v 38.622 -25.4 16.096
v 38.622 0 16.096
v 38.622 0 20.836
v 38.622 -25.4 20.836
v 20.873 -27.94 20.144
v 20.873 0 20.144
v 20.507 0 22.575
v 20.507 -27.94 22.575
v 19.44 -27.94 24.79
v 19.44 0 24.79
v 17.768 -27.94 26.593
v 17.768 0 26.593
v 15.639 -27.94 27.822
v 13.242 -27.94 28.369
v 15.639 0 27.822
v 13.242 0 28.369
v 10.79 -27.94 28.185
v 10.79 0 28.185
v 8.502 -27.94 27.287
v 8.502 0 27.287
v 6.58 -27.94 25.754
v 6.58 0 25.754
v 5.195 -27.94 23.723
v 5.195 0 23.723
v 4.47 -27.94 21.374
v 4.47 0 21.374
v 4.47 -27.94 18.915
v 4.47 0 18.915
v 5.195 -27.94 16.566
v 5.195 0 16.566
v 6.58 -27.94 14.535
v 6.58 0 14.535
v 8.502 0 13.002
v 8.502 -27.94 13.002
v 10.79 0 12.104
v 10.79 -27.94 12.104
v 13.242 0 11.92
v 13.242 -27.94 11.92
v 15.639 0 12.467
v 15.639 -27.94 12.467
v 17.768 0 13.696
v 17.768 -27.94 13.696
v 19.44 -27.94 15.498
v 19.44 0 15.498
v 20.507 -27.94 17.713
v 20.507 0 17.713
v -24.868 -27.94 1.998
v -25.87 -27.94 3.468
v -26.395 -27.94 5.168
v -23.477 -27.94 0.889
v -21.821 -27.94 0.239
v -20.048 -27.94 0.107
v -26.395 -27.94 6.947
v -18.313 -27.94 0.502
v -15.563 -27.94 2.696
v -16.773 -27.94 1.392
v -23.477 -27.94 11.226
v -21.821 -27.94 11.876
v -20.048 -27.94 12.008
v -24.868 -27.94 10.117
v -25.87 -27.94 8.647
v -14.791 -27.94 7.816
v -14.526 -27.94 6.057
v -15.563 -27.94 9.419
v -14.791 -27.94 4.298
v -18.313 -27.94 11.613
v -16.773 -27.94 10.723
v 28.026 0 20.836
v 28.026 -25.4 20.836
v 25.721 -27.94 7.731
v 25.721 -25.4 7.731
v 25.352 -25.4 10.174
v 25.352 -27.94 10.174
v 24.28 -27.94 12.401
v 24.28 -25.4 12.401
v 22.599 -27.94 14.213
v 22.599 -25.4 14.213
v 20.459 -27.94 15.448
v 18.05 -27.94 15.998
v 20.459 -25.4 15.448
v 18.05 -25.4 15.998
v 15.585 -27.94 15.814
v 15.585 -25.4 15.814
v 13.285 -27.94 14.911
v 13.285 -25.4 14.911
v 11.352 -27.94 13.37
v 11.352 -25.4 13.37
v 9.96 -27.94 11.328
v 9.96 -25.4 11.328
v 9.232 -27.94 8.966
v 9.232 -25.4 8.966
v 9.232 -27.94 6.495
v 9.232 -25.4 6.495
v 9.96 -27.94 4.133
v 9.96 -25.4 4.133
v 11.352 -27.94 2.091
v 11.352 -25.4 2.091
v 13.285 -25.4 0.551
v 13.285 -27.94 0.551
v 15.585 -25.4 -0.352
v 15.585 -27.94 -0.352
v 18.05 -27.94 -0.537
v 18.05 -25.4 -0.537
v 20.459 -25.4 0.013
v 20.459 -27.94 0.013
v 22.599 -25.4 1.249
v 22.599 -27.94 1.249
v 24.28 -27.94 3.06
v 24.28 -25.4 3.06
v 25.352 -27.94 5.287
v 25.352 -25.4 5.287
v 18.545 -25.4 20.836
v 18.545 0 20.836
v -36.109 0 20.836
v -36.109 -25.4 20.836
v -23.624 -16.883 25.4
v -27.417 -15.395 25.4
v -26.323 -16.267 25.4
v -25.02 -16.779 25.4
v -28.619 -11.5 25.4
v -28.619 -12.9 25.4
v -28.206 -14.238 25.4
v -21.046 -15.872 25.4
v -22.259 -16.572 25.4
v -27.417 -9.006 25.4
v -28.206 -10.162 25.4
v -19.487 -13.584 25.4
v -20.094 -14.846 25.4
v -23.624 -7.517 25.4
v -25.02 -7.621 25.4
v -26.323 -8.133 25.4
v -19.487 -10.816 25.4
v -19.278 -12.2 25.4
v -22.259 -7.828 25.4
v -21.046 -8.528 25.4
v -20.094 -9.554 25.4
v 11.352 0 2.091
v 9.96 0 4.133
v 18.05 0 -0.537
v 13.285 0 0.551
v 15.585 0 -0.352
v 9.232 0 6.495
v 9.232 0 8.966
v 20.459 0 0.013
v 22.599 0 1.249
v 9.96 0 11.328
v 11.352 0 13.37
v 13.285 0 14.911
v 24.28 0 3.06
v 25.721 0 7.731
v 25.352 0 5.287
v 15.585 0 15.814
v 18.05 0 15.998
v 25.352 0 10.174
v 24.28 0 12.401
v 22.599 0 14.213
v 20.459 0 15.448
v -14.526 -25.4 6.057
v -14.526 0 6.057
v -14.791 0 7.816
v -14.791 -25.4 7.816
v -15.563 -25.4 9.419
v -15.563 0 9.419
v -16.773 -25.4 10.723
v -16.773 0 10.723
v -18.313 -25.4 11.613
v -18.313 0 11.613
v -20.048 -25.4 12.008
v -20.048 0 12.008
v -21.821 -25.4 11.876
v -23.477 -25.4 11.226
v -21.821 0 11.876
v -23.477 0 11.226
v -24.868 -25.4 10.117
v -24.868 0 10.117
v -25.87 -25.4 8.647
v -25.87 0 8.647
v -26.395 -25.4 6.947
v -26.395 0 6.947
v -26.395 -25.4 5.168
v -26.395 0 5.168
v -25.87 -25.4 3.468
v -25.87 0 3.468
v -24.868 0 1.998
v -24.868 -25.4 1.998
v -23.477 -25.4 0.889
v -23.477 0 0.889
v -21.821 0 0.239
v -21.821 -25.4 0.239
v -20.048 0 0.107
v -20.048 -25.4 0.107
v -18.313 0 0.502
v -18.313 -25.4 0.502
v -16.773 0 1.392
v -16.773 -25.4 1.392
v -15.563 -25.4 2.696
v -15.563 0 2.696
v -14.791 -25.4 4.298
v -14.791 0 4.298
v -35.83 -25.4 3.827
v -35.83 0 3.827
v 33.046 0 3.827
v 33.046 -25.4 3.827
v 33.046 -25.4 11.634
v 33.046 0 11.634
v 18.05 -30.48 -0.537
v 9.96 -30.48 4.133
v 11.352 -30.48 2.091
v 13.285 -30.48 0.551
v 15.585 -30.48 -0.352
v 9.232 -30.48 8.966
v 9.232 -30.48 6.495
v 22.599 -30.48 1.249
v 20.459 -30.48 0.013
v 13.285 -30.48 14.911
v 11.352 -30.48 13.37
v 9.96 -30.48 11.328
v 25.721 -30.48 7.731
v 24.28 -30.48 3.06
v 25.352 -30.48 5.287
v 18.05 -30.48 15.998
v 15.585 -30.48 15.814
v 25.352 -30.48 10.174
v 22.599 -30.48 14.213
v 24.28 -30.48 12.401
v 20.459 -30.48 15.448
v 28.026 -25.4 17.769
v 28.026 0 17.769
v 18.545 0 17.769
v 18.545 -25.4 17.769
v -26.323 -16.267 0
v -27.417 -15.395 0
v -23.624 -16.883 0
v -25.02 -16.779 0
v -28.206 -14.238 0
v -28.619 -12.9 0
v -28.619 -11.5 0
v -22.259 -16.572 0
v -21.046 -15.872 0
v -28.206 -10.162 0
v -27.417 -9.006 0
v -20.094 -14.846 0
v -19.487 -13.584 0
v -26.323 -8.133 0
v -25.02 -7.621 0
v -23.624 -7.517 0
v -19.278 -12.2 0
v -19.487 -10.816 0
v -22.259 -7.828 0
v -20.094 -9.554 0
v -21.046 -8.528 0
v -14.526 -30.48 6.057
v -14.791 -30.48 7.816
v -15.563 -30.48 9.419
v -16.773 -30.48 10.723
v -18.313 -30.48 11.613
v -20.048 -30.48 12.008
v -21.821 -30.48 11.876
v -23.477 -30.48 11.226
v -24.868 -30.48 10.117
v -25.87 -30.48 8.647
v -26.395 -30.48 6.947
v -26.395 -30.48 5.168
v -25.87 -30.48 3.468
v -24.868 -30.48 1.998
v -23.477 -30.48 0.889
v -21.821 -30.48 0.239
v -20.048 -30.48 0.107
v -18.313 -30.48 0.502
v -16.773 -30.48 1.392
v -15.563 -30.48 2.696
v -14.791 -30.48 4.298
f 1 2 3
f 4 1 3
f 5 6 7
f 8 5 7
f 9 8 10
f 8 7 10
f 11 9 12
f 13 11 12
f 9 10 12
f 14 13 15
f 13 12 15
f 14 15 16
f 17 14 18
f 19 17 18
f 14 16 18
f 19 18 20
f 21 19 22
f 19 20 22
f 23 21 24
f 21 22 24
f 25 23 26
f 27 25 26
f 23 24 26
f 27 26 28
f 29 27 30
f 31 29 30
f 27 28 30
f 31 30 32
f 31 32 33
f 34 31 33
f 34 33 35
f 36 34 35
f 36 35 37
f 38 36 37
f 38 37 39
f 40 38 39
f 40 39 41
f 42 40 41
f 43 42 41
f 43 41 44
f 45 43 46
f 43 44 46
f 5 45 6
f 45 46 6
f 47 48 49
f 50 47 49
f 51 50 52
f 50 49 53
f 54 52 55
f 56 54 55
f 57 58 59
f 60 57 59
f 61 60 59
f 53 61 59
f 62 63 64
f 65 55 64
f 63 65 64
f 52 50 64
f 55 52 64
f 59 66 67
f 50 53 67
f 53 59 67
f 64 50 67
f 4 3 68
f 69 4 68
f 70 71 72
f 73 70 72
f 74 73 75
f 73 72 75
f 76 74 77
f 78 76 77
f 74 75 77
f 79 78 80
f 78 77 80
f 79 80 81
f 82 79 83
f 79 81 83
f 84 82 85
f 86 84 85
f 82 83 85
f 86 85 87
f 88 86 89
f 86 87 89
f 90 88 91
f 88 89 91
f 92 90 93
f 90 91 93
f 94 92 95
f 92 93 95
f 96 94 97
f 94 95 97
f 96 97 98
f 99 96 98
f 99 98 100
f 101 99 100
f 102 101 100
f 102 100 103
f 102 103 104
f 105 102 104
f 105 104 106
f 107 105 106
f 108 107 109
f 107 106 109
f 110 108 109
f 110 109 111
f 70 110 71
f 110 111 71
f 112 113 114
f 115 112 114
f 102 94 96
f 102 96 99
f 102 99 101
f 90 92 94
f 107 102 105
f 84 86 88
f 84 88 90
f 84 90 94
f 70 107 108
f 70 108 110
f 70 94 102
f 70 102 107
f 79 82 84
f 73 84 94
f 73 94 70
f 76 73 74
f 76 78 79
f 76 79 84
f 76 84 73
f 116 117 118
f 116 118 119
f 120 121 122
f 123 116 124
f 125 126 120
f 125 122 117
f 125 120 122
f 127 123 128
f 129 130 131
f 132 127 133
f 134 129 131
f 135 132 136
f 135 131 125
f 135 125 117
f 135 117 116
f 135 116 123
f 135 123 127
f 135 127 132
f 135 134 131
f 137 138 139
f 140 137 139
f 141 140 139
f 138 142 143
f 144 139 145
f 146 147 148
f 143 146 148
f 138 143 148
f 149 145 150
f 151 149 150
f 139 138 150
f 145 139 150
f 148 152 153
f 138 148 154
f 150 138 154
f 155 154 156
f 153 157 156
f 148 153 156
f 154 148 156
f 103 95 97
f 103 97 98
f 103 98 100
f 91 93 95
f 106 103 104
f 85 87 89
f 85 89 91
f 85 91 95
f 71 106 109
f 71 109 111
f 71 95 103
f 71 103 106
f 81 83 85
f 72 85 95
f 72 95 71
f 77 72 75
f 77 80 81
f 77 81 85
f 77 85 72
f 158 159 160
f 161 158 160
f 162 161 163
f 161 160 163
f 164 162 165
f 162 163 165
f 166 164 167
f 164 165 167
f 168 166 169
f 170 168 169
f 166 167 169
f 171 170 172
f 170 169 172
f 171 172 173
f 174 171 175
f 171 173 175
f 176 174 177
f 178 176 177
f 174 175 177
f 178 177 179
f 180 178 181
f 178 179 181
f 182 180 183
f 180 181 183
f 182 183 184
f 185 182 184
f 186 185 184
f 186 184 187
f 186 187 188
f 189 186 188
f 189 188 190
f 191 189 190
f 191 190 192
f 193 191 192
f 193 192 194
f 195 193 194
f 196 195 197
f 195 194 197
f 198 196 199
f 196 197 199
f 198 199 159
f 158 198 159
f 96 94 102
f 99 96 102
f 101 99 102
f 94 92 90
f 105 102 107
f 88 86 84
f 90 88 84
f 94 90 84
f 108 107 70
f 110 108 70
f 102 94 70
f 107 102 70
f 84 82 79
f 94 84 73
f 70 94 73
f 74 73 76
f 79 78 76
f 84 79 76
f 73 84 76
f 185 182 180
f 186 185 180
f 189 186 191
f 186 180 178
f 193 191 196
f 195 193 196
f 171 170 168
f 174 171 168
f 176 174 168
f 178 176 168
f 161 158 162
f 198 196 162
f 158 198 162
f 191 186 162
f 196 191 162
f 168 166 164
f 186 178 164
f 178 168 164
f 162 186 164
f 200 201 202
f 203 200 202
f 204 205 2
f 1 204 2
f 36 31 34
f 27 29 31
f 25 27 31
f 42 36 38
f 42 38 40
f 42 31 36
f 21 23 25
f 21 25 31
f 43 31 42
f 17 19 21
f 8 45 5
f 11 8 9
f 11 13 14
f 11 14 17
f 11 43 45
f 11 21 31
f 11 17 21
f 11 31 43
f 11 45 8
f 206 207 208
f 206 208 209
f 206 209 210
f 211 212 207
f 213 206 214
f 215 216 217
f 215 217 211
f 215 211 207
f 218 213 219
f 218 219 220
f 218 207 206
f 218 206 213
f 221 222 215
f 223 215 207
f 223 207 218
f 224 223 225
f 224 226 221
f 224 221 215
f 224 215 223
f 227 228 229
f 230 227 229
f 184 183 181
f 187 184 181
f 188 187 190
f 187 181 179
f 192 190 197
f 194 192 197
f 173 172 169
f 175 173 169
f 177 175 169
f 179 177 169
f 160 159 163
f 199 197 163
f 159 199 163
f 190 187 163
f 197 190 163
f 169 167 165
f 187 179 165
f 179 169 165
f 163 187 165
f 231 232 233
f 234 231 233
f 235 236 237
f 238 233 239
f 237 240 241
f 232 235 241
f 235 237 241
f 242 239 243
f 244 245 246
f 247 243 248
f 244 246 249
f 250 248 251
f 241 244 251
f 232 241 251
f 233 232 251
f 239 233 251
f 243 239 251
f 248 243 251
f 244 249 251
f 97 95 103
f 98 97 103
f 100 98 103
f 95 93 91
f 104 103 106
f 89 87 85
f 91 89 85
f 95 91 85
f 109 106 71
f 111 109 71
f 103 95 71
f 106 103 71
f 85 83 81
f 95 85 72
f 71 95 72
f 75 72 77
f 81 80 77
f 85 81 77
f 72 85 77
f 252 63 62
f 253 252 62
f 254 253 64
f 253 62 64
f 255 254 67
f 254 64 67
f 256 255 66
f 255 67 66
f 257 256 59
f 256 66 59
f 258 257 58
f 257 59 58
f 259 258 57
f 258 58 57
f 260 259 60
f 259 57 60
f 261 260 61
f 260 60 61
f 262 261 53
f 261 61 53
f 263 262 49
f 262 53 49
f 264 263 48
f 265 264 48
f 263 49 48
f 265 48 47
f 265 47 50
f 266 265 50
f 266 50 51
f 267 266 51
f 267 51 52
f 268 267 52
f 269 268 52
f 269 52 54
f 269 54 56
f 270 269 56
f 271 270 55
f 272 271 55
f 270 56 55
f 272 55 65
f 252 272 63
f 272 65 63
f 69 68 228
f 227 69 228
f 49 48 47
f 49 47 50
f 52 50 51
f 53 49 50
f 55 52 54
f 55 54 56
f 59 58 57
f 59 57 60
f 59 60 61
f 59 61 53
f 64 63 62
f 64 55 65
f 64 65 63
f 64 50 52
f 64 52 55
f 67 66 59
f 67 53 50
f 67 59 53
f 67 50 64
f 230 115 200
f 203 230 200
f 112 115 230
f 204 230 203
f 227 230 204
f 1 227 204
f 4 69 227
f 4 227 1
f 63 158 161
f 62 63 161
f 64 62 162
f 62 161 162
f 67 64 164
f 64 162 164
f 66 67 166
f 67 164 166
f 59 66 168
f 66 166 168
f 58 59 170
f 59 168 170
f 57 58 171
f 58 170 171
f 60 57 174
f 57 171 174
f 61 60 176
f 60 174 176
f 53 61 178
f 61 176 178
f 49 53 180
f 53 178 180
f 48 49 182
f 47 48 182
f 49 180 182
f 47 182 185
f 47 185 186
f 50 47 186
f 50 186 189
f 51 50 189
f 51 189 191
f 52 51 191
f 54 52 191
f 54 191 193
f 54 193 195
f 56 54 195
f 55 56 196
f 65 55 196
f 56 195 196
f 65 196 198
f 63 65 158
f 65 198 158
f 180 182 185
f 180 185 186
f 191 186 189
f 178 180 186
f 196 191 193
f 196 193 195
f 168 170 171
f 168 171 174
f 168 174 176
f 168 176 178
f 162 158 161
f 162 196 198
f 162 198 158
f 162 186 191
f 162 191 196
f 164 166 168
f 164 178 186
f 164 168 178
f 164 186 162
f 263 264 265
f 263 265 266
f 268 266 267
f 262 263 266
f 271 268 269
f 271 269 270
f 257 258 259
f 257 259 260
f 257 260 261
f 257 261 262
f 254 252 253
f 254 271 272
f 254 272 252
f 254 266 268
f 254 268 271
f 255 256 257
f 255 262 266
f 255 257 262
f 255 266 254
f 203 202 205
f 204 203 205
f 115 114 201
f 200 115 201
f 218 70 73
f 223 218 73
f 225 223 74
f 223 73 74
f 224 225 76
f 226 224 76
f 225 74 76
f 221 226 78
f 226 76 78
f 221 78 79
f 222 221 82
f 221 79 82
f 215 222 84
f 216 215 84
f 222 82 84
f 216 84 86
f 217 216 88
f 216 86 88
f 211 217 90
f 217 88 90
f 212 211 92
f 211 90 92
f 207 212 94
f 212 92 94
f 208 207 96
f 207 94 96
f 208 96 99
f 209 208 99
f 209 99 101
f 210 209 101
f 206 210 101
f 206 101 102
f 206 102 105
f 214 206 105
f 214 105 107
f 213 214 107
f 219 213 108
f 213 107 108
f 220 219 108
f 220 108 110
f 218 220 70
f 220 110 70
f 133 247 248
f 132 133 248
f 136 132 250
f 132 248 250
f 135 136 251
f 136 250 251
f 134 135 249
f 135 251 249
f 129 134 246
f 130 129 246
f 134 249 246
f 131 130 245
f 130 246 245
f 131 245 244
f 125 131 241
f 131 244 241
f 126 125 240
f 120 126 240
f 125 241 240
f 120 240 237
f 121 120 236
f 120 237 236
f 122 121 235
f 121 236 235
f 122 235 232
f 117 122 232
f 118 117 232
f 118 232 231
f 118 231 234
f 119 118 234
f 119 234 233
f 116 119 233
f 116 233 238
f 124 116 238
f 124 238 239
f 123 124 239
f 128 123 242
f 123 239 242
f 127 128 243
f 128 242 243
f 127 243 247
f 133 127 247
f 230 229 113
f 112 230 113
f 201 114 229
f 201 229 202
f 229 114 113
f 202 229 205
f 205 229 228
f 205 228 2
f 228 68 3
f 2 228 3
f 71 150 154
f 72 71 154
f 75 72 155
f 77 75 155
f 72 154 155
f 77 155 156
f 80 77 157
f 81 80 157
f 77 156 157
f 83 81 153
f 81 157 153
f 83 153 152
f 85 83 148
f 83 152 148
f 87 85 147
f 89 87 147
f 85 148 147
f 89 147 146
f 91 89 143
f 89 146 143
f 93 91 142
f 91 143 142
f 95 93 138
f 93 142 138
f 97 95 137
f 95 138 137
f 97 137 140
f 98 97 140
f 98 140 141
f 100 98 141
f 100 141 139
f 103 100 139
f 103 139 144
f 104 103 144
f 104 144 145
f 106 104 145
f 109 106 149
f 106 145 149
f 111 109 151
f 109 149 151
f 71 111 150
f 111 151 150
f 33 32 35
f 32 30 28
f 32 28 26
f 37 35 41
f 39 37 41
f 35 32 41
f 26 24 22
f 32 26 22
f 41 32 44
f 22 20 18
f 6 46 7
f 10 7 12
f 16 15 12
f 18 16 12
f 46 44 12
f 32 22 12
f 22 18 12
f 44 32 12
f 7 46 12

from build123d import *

# Parameters (mm, degrees)
F0_R     = 8.2907829743
F1_DEPTH = 25.4
F0_R_2   = 5.9676342743
F3_DEPTH = 25.4
F4_DEPTH = 2.54
F5_R     = 8.2475246833
F6_DEPTH = 27.94
F7_DEPTH = 2.54
F8_R     = 4.6964570027
F9_DEPTH = 25.4


with BuildPart() as f1:
    # F0 (on Front) → F1 (new body)
    with BuildSketch(Plane.XZ):
        with Locations((17.4299459904, 7.7305850573)):
            Circle(F0_R)
    extrude(amount=F1_DEPTH)


with BuildPart() as f1b:
    # F0 (on Front) → F1, piece 2 (new body)
    with BuildSketch(Plane.XZ):
        with Locations((-20.4935502261, 6.057490129)):
            Circle(F0_R_2)
    extrude(amount=F1_DEPTH)


with BuildPart() as f3:
    # F2 (on Front) → F3 (new body)
    with BuildSketch(Plane.XZ):
        Polygon((-36.1091047525, 20.8364985883), (-35.8302555978, 3.8266964257), (33.0455005169, 3.8266964257), (33.0455005169, 11.6344736889), (38.6224836111, 16.0960629582), (38.6224836111, 20.8364985883), (28.0262120068, 20.8364985883), (28.0262120068, 17.7691578865), (18.5453407466, 17.7691578865), (18.5453407466, 20.8364985883), align=None)
    extrude(amount=F3_DEPTH)


with BuildPart() as f4:
    # F4 (new): a face of the model
    f4_faces = [f1b.part.faces().sort_by_distance(p)[0] for p in [
        (-20.4935502261, -25.4, 6.057490129),
    ]]
    extrude(f4_faces, amount=F4_DEPTH)


with BuildPart() as f4b:
    # F4#2 (new): a face of the model
    f4_2_faces = [f1.part.faces().sort_by_distance(p)[0] for p in [
        (17.4299459904, -25.4, 7.7305850573),
    ]]
    extrude(f4_2_faces, amount=F4_DEPTH)


with BuildPart() as f6:
    # F5 (on Front) → F6 (new body)
    with BuildSketch(Plane.XZ):
        with Locations((12.6256905496, 20.1443620026)):
            Circle(F5_R)
    extrude(amount=F6_DEPTH)


with BuildPart() as f7:
    # F7 (new): a face of the model
    f7_faces = [f4.part.faces().sort_by_distance(p)[0] for p in [
        (-20.4935502261, -27.94, 6.057490129),
    ]]
    extrude(f7_faces, amount=F7_DEPTH)


with BuildPart() as f7b:
    # F7#2 (new): a face of the model
    f7_2_faces = [f4b.part.faces().sort_by_distance(p)[0] for p in [
        (17.4299459904, -27.94, 7.7305850573),
    ]]
    extrude(f7_2_faces, amount=F7_DEPTH)


with BuildPart() as f9:
    # F8 (on Top) → F9 (new body)
    with BuildSketch(Plane.XY):
        with Locations((-23.9746272564, -12.2001068667)):
            Circle(F8_R)
    extrude(amount=F9_DEPTH)


solid = Compound([f1.part, f1b.part, f3.part, f4.part, f4b.part, f6.part, f7.part, f7b.part, f9.part])
